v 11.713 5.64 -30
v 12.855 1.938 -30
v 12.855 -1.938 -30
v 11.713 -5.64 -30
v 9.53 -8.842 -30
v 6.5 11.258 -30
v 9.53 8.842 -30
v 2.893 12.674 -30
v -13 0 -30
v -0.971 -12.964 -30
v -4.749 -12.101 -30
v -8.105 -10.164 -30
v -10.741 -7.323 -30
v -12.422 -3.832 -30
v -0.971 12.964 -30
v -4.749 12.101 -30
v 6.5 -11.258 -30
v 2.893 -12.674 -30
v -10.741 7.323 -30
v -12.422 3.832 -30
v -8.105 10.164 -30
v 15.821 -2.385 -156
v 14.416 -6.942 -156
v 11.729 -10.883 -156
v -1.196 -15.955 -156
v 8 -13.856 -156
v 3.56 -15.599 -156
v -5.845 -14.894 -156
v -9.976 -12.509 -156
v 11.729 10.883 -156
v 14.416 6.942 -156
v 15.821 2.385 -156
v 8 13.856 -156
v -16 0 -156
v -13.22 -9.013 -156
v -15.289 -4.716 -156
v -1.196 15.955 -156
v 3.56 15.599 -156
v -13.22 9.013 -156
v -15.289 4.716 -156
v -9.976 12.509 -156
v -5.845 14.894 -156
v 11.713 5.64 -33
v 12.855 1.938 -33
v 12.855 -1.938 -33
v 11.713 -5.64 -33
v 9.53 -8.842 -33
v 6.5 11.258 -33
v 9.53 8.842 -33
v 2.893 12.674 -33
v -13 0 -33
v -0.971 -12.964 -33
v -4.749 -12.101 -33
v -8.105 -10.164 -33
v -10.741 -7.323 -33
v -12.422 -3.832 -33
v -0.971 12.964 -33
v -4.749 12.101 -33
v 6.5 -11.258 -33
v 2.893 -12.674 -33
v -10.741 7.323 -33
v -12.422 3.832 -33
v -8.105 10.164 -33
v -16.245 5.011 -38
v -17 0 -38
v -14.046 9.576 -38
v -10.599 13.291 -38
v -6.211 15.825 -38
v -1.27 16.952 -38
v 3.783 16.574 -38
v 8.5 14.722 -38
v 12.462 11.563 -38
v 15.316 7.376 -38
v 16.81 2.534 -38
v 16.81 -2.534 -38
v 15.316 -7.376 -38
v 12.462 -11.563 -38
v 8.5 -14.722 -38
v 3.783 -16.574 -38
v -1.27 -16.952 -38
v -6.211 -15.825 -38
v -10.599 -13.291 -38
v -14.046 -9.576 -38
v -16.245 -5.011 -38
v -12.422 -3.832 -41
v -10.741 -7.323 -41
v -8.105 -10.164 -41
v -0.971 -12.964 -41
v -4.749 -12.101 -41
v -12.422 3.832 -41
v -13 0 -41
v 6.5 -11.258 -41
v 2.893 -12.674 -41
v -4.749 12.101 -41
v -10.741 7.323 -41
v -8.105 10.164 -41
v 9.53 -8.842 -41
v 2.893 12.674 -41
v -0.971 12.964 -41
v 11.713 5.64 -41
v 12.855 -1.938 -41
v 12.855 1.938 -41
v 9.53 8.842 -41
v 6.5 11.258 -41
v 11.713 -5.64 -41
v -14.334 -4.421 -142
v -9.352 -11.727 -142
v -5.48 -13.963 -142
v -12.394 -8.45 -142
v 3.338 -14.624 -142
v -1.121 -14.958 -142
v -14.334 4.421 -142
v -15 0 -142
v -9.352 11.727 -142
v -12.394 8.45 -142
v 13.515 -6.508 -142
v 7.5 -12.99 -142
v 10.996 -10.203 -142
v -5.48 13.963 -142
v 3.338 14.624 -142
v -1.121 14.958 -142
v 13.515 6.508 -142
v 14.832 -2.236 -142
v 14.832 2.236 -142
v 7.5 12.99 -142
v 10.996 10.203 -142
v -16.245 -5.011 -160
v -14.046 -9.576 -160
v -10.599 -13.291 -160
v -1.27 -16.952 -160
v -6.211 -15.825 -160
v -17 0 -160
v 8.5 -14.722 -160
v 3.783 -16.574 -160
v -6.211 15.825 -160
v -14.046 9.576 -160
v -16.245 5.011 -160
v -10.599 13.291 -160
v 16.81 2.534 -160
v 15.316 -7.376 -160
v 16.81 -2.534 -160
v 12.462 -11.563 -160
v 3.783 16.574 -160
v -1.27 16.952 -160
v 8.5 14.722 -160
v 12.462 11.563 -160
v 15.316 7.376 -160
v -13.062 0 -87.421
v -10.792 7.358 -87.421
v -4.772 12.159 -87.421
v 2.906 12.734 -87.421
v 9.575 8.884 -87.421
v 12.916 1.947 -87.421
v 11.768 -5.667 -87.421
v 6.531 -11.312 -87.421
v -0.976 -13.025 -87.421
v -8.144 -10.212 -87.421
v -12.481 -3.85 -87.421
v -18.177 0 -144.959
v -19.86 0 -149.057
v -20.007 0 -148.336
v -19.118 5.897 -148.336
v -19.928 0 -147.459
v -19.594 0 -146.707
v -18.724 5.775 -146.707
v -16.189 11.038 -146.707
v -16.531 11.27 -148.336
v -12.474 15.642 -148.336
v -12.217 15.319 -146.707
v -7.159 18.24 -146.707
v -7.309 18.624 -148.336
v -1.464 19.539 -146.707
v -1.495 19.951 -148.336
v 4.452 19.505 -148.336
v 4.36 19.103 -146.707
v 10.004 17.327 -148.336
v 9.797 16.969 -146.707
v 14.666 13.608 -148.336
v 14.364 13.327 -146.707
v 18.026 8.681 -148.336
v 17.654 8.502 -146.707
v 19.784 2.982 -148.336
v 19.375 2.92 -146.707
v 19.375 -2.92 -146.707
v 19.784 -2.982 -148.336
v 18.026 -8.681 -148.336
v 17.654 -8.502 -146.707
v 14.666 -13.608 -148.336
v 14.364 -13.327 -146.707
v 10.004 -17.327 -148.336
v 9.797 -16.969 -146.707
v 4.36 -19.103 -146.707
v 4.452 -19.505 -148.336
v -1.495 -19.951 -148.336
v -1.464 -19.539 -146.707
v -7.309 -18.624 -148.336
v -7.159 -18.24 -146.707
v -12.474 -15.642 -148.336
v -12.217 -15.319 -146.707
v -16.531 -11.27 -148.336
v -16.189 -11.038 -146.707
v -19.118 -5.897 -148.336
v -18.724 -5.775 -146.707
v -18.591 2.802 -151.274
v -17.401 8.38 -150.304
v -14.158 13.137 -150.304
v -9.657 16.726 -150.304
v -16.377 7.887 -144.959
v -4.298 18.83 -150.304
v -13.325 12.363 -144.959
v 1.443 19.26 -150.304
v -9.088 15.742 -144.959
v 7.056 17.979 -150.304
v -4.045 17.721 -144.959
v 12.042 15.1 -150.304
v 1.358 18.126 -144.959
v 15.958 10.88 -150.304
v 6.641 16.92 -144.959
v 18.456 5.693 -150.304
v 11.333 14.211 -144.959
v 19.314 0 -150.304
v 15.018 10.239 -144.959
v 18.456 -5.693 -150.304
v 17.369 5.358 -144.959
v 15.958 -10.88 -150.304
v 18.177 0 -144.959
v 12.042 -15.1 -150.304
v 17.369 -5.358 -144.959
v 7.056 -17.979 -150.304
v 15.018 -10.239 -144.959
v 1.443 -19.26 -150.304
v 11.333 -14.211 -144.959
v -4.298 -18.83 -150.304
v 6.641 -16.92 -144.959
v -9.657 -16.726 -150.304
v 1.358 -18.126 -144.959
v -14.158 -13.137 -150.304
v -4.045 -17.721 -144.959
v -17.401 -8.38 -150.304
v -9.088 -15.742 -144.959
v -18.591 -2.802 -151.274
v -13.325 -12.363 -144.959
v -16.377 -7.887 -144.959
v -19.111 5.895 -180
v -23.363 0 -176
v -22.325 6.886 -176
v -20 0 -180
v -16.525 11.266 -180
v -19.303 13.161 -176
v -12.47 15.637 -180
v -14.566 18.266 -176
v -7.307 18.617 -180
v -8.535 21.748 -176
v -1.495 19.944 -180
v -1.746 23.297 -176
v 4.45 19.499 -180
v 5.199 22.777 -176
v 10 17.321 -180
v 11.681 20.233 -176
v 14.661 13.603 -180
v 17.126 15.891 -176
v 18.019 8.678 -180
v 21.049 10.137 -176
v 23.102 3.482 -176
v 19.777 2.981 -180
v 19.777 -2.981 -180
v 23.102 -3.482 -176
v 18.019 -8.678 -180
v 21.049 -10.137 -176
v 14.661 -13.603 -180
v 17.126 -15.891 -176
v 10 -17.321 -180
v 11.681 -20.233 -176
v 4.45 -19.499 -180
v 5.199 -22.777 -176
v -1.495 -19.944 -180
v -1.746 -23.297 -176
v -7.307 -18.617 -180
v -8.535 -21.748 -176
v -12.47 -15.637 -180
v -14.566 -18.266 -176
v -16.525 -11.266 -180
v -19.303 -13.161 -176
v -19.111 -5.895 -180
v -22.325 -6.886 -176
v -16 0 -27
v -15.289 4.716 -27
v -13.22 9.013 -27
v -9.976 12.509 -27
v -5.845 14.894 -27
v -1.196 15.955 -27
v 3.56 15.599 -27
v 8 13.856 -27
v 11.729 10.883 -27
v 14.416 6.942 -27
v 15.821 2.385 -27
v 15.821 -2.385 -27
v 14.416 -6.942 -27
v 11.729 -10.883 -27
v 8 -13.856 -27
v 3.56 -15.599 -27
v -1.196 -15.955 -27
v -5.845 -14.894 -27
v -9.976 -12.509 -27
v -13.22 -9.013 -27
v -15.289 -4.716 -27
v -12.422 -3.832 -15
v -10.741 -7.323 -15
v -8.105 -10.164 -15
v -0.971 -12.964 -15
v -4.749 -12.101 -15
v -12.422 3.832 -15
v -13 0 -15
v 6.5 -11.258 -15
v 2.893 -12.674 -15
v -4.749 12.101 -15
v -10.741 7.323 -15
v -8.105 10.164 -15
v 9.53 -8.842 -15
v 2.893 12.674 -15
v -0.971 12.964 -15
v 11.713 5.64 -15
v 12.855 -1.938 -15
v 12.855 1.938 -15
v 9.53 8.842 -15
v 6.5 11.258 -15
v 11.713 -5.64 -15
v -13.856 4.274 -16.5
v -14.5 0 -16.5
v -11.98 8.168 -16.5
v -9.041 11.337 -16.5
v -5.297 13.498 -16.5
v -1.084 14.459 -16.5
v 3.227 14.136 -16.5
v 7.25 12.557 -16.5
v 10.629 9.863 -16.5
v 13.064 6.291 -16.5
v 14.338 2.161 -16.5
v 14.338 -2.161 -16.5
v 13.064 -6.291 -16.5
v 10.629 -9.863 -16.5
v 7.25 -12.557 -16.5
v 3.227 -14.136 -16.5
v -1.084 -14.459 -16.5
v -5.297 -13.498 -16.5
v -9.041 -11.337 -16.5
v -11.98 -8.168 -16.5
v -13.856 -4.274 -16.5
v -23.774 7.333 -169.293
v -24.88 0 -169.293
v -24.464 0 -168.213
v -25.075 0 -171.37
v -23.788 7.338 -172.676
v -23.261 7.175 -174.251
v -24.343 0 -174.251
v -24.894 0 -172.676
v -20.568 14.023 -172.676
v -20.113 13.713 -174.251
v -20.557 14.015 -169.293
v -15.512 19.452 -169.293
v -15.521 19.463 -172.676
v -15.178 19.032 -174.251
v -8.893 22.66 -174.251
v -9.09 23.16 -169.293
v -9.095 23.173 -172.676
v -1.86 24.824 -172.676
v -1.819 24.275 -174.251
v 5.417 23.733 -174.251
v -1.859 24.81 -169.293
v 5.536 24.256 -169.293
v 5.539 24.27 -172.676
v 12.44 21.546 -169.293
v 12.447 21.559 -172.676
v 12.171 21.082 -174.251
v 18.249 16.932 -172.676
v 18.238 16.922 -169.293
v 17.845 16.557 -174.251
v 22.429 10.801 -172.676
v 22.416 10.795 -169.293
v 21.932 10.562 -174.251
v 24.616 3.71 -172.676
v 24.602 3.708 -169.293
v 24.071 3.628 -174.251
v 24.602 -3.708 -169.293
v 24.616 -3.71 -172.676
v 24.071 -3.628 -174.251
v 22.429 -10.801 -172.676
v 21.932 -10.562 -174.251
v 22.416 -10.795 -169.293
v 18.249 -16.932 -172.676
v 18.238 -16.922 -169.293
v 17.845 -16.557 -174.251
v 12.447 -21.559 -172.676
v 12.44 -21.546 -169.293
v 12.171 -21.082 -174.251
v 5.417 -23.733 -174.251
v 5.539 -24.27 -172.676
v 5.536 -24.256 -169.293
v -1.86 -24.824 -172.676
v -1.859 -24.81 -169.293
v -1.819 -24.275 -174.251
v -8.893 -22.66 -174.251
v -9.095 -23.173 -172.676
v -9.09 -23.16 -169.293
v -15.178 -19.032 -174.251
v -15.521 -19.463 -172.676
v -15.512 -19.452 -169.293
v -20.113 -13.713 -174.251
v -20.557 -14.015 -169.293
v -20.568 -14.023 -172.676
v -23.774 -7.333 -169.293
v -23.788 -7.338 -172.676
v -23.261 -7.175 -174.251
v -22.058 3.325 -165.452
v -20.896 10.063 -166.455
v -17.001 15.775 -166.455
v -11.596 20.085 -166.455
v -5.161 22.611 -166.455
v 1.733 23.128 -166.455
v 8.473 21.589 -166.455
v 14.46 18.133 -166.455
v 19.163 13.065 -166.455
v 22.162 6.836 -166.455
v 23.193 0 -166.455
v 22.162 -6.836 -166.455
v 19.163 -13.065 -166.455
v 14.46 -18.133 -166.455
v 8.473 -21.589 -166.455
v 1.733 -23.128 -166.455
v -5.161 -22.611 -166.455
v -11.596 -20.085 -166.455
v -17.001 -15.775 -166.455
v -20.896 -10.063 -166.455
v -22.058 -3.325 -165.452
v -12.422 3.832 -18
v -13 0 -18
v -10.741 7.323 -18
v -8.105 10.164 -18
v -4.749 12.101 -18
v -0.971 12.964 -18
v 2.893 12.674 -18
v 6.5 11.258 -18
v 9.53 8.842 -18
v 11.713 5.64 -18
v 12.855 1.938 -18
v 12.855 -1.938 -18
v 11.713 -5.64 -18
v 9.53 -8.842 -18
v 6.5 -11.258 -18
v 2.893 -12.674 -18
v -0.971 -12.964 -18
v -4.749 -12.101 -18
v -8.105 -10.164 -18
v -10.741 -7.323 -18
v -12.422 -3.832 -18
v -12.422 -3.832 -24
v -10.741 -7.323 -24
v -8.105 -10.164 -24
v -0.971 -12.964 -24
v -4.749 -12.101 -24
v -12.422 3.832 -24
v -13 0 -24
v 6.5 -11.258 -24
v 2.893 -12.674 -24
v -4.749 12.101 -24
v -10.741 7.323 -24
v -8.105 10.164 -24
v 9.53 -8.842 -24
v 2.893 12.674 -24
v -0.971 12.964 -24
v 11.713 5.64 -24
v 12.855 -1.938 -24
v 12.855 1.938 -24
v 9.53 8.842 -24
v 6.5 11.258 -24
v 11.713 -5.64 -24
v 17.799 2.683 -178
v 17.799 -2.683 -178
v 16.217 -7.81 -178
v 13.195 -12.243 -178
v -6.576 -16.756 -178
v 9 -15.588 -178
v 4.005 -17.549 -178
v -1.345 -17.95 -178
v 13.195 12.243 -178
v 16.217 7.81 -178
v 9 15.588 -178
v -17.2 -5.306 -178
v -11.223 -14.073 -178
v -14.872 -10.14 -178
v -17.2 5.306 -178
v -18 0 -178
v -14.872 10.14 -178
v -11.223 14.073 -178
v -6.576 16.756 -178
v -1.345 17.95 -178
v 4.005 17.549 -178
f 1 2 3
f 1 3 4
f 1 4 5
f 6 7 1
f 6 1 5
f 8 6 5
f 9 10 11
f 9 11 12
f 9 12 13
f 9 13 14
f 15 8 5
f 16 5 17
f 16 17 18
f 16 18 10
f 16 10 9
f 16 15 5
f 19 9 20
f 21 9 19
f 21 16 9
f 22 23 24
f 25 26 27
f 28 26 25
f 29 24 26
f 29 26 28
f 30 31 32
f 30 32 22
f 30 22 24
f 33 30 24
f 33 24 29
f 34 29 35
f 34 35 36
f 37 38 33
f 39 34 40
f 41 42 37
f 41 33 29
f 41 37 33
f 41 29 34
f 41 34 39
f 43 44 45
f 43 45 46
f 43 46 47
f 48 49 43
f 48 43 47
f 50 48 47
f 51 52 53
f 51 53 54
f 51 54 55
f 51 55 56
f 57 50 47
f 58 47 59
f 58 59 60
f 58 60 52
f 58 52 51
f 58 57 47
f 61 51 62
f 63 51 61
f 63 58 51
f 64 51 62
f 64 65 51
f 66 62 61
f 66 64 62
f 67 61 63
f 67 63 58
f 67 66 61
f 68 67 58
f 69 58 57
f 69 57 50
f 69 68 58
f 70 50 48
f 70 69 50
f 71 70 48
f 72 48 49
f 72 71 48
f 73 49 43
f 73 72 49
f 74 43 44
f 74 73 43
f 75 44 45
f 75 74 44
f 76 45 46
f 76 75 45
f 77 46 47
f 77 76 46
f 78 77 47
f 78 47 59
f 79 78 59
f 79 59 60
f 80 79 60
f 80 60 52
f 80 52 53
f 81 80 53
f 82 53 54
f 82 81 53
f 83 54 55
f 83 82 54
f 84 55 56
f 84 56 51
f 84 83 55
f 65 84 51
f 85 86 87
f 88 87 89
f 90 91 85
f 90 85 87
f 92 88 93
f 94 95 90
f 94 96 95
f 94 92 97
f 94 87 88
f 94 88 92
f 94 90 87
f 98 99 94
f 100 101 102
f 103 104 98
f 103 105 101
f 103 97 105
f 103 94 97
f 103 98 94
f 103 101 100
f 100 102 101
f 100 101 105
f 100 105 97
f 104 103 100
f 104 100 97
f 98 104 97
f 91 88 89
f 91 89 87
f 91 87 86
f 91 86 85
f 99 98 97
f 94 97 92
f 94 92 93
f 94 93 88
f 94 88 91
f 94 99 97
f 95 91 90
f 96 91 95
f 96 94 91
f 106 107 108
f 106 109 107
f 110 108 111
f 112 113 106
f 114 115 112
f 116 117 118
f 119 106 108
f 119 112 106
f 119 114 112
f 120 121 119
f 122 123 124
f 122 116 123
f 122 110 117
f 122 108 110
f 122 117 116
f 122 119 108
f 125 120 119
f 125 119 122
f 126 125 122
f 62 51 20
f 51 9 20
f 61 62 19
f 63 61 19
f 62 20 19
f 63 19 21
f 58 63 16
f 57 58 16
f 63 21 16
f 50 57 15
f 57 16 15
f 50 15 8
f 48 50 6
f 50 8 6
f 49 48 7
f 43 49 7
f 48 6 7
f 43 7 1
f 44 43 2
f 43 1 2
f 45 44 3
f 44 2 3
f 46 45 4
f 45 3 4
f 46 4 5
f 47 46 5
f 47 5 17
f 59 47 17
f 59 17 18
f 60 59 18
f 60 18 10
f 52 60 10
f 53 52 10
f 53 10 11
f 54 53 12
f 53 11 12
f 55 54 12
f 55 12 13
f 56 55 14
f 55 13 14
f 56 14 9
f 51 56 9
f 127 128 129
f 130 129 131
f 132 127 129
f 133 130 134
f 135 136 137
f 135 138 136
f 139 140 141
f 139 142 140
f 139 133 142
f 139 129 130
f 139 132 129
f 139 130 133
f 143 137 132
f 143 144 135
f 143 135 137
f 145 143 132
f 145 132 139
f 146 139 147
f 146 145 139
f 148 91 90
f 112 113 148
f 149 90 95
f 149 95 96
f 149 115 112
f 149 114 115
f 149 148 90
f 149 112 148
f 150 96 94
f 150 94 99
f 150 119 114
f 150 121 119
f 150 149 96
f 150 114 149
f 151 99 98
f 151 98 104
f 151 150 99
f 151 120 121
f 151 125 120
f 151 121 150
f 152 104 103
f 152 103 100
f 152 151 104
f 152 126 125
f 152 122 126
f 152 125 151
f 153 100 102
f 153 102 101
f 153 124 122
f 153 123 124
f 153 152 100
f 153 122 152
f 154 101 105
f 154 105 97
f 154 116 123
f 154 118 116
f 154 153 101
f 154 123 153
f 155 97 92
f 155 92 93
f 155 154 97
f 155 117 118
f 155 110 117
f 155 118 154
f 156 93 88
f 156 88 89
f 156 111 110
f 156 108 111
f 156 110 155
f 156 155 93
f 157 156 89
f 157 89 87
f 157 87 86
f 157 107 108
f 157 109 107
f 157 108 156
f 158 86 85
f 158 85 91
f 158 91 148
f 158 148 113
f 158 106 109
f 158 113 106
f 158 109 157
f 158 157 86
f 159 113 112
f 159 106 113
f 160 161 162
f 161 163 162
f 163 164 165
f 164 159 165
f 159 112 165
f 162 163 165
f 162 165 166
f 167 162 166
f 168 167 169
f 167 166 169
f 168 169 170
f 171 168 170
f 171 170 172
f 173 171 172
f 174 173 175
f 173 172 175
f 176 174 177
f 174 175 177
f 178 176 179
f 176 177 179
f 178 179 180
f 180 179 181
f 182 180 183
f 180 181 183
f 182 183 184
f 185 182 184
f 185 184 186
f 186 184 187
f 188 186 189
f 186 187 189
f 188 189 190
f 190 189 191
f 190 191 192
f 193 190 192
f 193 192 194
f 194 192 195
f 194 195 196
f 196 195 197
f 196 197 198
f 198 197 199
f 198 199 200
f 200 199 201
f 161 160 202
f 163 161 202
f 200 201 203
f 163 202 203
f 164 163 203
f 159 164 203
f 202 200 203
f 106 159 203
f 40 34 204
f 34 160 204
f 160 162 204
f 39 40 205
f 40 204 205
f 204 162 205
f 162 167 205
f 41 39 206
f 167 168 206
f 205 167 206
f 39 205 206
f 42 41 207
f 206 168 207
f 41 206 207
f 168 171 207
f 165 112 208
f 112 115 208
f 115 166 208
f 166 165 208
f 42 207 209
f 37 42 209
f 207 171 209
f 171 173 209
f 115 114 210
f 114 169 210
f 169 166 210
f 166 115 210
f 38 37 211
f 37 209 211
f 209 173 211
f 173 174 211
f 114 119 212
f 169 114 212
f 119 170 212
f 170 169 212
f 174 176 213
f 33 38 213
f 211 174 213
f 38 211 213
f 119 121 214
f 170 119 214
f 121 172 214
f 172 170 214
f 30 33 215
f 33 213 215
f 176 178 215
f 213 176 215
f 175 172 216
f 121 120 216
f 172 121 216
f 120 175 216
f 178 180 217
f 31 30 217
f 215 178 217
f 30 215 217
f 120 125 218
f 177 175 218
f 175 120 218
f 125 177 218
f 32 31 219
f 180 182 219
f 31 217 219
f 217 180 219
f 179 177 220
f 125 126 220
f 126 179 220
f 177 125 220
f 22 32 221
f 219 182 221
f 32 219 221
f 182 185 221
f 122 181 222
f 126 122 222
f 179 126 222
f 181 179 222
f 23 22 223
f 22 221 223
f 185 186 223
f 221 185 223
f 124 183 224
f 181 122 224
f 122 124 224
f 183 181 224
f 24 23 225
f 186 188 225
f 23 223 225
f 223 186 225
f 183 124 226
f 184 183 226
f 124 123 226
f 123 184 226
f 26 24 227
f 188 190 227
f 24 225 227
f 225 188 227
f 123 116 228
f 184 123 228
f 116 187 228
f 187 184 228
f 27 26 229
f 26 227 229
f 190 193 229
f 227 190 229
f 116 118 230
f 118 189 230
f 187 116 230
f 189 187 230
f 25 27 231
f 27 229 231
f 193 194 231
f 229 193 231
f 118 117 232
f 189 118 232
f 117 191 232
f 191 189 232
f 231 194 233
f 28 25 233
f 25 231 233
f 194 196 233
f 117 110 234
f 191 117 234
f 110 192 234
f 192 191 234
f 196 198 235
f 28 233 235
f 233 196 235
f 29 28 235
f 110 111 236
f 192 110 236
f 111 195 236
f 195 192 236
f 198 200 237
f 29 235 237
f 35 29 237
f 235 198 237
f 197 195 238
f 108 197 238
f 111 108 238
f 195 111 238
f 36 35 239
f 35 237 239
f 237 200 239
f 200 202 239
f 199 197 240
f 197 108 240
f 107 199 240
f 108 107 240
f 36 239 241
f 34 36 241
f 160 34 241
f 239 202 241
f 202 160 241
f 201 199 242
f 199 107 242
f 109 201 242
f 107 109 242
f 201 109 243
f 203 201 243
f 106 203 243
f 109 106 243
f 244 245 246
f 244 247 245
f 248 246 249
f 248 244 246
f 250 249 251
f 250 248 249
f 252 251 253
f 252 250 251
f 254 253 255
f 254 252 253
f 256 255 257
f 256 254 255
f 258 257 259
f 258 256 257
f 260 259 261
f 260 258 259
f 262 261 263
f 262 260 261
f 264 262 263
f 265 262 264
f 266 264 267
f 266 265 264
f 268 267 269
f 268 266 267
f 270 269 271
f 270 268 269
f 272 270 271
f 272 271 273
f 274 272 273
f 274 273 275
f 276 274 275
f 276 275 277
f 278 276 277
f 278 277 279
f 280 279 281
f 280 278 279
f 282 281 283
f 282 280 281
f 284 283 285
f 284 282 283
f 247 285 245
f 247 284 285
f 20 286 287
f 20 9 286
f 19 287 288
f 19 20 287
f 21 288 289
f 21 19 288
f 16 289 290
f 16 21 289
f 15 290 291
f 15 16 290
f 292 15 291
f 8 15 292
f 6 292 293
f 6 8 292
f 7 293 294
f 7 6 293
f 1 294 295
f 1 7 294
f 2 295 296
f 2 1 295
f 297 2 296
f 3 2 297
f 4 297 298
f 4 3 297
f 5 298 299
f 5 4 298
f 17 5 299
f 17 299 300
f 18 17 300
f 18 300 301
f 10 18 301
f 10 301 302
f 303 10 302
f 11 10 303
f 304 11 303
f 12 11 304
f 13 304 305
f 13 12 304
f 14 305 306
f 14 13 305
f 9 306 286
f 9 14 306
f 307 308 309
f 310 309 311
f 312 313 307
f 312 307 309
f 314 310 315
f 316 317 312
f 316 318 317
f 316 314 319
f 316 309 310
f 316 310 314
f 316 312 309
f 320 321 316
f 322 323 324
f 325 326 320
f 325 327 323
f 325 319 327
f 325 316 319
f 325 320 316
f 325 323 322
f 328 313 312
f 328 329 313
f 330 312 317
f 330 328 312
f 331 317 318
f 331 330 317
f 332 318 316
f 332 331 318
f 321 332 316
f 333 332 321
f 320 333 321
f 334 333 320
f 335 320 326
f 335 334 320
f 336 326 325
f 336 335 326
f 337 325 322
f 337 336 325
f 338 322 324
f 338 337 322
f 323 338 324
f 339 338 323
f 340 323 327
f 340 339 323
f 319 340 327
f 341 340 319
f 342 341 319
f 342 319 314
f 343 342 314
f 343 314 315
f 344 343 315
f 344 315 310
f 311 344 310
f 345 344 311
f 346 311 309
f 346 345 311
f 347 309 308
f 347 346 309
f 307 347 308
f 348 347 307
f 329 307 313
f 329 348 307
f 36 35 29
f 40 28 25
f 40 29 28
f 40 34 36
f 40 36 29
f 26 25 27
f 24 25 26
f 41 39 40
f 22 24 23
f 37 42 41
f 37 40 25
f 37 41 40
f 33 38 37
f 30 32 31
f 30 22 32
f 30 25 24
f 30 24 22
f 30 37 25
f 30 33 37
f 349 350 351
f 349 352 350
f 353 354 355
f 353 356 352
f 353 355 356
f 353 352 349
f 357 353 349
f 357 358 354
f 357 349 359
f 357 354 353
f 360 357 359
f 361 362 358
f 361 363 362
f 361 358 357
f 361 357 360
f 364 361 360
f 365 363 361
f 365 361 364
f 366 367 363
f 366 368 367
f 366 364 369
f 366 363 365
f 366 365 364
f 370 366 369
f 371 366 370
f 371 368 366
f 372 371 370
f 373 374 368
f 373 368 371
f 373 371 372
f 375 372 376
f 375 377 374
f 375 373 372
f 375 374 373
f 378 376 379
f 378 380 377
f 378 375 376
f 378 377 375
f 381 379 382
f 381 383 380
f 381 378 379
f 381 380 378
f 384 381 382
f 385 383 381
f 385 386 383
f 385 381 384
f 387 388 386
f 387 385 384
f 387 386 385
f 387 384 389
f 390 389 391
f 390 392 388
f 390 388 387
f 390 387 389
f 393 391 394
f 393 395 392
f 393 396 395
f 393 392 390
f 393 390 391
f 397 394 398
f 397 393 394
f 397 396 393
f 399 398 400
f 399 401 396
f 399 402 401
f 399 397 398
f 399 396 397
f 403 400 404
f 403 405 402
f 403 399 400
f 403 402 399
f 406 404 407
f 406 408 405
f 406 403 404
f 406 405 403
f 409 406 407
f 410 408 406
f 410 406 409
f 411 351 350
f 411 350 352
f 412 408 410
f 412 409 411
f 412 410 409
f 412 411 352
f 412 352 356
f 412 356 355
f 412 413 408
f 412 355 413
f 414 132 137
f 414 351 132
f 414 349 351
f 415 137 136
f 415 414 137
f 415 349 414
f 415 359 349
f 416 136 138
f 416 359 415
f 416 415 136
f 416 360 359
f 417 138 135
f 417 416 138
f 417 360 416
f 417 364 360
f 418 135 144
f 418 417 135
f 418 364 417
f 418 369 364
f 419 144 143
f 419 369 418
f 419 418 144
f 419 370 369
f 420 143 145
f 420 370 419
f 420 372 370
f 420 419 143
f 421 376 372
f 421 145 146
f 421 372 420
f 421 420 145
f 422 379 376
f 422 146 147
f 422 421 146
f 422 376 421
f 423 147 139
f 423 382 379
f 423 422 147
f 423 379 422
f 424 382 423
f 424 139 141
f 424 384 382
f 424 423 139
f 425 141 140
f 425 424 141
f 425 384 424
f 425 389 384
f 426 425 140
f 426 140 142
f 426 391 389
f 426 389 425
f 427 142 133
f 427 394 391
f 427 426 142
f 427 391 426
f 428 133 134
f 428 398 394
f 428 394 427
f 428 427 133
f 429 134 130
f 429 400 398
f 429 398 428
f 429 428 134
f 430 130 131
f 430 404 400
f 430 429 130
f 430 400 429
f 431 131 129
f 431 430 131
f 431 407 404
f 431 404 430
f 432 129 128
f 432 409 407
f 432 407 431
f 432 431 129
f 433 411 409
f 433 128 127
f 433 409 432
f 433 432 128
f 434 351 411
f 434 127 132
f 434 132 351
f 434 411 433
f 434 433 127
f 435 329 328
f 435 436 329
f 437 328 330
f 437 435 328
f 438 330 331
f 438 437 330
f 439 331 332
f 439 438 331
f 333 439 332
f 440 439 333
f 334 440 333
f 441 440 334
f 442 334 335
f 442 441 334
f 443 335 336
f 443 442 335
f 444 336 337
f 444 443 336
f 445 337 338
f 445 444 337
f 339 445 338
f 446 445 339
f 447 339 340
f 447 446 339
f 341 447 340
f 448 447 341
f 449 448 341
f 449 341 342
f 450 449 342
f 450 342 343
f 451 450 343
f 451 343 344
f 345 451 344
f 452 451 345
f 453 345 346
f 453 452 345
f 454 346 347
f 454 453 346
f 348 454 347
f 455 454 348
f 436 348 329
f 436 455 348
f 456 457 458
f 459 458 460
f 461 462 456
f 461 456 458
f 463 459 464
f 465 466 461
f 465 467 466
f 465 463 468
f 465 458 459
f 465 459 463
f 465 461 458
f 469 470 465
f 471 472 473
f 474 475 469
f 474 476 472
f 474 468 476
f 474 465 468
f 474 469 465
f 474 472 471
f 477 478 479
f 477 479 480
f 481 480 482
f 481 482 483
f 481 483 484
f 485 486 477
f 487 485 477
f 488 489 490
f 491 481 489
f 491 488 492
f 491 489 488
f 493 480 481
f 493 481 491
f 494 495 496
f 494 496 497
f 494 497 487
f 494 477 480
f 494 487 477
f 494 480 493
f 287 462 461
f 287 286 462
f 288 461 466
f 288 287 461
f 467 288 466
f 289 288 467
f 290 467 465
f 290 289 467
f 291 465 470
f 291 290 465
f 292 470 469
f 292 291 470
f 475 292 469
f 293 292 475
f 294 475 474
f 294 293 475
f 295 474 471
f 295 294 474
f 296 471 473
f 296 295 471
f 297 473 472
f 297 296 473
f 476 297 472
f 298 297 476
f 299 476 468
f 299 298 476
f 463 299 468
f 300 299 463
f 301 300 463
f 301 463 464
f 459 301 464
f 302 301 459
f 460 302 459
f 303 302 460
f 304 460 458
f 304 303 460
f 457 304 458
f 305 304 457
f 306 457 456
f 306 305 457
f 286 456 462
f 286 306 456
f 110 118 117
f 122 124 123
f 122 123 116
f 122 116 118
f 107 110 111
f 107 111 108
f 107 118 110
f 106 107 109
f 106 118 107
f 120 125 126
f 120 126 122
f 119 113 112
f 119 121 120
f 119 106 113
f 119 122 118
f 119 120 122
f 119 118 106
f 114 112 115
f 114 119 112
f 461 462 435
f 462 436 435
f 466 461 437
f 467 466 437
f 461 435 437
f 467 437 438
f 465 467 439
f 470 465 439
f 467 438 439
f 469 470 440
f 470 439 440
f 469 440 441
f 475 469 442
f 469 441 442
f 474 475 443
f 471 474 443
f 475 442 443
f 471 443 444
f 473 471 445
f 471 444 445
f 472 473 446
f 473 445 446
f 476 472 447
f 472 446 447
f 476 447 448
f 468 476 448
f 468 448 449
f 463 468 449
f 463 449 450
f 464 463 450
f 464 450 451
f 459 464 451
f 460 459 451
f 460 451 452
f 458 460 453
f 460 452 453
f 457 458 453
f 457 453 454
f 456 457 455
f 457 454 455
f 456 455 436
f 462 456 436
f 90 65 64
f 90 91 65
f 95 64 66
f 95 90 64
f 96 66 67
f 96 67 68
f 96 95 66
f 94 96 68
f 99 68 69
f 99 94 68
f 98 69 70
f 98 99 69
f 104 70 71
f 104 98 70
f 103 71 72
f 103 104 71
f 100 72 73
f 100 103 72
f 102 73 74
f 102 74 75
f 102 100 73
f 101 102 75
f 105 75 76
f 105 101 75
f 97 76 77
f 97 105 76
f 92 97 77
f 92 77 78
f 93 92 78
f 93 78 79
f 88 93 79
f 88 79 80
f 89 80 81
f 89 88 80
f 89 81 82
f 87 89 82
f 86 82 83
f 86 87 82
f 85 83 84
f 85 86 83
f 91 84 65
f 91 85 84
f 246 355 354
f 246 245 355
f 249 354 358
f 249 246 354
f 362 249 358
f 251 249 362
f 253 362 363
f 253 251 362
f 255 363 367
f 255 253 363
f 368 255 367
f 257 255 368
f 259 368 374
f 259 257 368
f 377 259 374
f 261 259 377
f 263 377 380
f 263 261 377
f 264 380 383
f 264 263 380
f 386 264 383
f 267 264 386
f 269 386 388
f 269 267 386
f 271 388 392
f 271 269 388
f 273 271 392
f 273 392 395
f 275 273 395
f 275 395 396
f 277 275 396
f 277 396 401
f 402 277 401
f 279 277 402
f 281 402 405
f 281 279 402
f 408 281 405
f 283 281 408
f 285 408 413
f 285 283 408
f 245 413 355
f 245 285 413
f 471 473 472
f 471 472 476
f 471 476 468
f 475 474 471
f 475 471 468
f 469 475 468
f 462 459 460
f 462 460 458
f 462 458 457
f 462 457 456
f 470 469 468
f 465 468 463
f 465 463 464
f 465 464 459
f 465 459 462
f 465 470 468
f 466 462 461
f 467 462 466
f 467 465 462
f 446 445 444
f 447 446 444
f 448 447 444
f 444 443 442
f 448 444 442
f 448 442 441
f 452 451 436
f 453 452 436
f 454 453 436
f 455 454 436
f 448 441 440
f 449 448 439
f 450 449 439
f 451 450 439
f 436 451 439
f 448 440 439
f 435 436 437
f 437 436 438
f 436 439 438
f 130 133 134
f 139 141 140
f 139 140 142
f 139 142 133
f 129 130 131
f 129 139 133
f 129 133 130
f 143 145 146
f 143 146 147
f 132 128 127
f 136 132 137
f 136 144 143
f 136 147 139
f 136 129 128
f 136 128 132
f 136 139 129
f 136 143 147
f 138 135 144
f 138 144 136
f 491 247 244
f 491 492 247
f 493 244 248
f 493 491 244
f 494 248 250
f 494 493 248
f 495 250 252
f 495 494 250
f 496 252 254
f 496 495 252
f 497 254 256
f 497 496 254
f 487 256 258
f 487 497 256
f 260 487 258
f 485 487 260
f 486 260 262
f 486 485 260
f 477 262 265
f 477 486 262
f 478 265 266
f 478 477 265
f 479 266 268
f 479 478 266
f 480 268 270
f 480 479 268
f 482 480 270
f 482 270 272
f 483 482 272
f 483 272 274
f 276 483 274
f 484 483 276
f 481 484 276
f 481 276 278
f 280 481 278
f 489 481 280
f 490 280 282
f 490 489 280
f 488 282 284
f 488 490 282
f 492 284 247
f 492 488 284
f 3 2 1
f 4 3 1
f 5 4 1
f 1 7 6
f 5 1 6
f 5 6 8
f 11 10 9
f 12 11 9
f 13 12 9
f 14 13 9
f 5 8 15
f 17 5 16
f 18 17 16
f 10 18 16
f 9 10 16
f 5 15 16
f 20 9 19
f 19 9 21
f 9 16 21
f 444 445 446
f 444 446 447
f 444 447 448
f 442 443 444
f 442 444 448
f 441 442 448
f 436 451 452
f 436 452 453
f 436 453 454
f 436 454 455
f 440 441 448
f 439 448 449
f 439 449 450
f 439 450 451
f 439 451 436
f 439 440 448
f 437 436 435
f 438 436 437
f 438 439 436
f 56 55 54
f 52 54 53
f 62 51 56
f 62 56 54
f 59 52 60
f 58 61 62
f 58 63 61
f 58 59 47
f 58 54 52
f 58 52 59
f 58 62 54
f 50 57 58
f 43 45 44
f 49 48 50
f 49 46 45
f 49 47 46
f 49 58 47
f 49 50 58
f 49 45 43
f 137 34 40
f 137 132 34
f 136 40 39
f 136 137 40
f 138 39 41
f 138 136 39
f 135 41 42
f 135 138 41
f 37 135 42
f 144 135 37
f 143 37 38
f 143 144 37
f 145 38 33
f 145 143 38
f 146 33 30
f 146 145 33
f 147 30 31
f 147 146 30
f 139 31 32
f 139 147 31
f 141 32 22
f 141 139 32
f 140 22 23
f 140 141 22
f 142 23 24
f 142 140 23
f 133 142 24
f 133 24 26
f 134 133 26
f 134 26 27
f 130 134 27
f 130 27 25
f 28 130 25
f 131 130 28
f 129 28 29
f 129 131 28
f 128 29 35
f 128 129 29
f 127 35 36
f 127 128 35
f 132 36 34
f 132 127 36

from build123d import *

# Parameters (mm, degrees)
F0_W   = 13
F0_H   = 6
F0_H_2 = 3


with BuildPart() as f1:
    # F0 (on Front) → F1 (revolve)
    with BuildSketch(Plane.XZ):
        with BuildLine():
            Line((0, -178), (0, -160))
            Line((0, -160), (-17, -160))
            add(Edge.make_bspline(
                [(-17, -160), (-24.3, -167.3), (-24.980532811, -168.4359209337), (-25.2089356314, -172.352152053), (-24.3429610158, -174.2508982315)],
                knots=[0, 0, 0, 0, 0.5169655278, 0.7853894573, 0.7853894573, 0.7853894573, 0.7853894573], degree=3))
            Line((-24.3429610158, -174.2508982315), (-22.7917064089, -173.229793401))
            Line((-22.7917064089, -173.229793401), (-21.6920656283, -174.9003592194))
            Line((-21.6920656283, -174.9003592194), (-23.3626314467, -176))
            add(Edge.make_bspline(
                [(-23.3626314467, -176), (-22.6023784669, -177.1549704813), (-21.5225421968, -178.4774578032), (-20, -180)],
                knots=[0.8612376667, 0.8612376667, 0.8612376667, 0.8612376667, 1, 1, 1, 1], degree=3))
            Line((-20, -180), (-18, -178))
            Line((-18, -178), (0, -178))
        make_face()
        with BuildLine():
            Line((-22.7917064089, -173.229793401), (-24.3429610158, -174.2508982315))
            add(Edge.make_bspline(
                [(-24.3429610158, -174.2508982315), (-24.0982636666, -174.7874245319), (-23.7781896597, -175.3686871582), (-23.3626314467, -176)],
                knots=[0.7853894573, 0.7853894573, 0.7853894573, 0.7853894573, 0.8612376667, 0.8612376667, 0.8612376667, 0.8612376667], degree=3))
            Line((-23.3626314467, -176), (-21.6920656283, -174.9003592194))
            Line((-21.6920656283, -174.9003592194), (-22.7917064089, -173.229793401))
        make_face()
    revolve(axis=Axis((0, 0, -94.6546308696), (0, 0, -1)))


with BuildPart() as f1b:
    # F0 (on Front) → F1, piece 2 (revolve)
    with BuildSketch(Plane.XZ):
        with BuildLine():
            Line((0, -156), (0, -142))
            Line((0, -142), (-15, -142))
            add(Edge.make_bspline(
                [(-16, -156), (-20.0816467404, -149.3781763315), (-20.0078994568, -148.2936880257), (-19.9139416218, -146.2476807833), (-15, -142)],
                knots=[0, 0, 0, 0, 0.5169405615, 1, 1, 1, 1], degree=3))
            Line((-16, -156), (0, -156))
        make_face()
    revolve(axis=Axis((0, 0, -94.6546308696), (0, 0, -1)))


with BuildPart() as f1c:
    # F0 (on Front) → F1, piece 3 (revolve)
    with BuildSketch(Plane.XZ):
        Polygon((0, -41), (0, -33), (-13, -33), (-17, -38), (-13, -41), align=None)
    revolve(axis=Axis((0, 0, -94.6546308696), (0, 0, -1)))


with BuildPart() as f1d:
    # F0 (on Front) → F1, piece 4 (revolve)
    with BuildSketch(Plane.XZ):
        Polygon((0, -30), (0, -24), (-13, -24), (-16, -27), (-13, -30), align=None)
    revolve(axis=Axis((0, 0, -94.6546308696), (0, 0, -1)))


with BuildPart() as f1e:
    # F0 (on Front) → F1, piece 5 (revolve)
    with BuildSketch(Plane.XZ):
        Polygon((0, -18), (0, -15), (-13, -15), (-14.5, -16.5), (-13, -18), align=None)
    revolve(axis=Axis((0, 0, -94.6546308696), (0, 0, -1)))


with BuildPart() as f2:
    # F0 (on Front) → F2 (revolve)
    with BuildSketch(Plane.XZ):
        with Locations((-6.5, -21)):
            Rectangle(F0_W, F0_H)
    revolve(axis=Axis((0, 0, -94.6546308696), (0, 0, -1)))


with BuildPart() as f2b:
    # F0 (on Front) → F2, piece 2 (revolve)
    with BuildSketch(Plane.XZ):
        with Locations((-6.5, -31.5)):
            Rectangle(F0_W, F0_H_2)
    revolve(axis=Axis((0, 0, -94.6546308696), (0, 0, -1)))


with BuildPart() as f2c:
    # F0 (on Front) → F2, piece 3 (revolve)
    with BuildSketch(Plane.XZ):
        Polygon((0, -160), (0, -156), (-16, -156), (-17, -160), align=None)
    revolve(axis=Axis((0, 0, -94.6546308696), (0, 0, -1)))


with BuildPart() as f3:
    # F0 (on Front) → F3 (revolve)
    with BuildSketch(Plane.XZ):
        with BuildLine():
            Line((0, -142), (0, -41))
            Line((0, -41), (-13, -41))
            add(Edge.make_bspline(
                [(-13, -41), (-12.9412225997, -60.457119119), (-12.6519423783, -80.461874006), (-14.072800506, -121.3039956721), (-14.3802237204, -132.6450677331), (-15, -142)],
                knots=[0, 0, 0, 0, 0.3801098043, 0.7279740858, 1, 1, 1, 1], degree=3))
            Line((-15, -142), (0, -142))
        make_face()
    revolve(axis=Axis((0, 0, -94.6546308696), (0, 0, -1)))


solid = Compound([f1.part, f1b.part, f1c.part, f1d.part, f1e.part, f2.part, f2b.part, f2c.part, f3.part])
